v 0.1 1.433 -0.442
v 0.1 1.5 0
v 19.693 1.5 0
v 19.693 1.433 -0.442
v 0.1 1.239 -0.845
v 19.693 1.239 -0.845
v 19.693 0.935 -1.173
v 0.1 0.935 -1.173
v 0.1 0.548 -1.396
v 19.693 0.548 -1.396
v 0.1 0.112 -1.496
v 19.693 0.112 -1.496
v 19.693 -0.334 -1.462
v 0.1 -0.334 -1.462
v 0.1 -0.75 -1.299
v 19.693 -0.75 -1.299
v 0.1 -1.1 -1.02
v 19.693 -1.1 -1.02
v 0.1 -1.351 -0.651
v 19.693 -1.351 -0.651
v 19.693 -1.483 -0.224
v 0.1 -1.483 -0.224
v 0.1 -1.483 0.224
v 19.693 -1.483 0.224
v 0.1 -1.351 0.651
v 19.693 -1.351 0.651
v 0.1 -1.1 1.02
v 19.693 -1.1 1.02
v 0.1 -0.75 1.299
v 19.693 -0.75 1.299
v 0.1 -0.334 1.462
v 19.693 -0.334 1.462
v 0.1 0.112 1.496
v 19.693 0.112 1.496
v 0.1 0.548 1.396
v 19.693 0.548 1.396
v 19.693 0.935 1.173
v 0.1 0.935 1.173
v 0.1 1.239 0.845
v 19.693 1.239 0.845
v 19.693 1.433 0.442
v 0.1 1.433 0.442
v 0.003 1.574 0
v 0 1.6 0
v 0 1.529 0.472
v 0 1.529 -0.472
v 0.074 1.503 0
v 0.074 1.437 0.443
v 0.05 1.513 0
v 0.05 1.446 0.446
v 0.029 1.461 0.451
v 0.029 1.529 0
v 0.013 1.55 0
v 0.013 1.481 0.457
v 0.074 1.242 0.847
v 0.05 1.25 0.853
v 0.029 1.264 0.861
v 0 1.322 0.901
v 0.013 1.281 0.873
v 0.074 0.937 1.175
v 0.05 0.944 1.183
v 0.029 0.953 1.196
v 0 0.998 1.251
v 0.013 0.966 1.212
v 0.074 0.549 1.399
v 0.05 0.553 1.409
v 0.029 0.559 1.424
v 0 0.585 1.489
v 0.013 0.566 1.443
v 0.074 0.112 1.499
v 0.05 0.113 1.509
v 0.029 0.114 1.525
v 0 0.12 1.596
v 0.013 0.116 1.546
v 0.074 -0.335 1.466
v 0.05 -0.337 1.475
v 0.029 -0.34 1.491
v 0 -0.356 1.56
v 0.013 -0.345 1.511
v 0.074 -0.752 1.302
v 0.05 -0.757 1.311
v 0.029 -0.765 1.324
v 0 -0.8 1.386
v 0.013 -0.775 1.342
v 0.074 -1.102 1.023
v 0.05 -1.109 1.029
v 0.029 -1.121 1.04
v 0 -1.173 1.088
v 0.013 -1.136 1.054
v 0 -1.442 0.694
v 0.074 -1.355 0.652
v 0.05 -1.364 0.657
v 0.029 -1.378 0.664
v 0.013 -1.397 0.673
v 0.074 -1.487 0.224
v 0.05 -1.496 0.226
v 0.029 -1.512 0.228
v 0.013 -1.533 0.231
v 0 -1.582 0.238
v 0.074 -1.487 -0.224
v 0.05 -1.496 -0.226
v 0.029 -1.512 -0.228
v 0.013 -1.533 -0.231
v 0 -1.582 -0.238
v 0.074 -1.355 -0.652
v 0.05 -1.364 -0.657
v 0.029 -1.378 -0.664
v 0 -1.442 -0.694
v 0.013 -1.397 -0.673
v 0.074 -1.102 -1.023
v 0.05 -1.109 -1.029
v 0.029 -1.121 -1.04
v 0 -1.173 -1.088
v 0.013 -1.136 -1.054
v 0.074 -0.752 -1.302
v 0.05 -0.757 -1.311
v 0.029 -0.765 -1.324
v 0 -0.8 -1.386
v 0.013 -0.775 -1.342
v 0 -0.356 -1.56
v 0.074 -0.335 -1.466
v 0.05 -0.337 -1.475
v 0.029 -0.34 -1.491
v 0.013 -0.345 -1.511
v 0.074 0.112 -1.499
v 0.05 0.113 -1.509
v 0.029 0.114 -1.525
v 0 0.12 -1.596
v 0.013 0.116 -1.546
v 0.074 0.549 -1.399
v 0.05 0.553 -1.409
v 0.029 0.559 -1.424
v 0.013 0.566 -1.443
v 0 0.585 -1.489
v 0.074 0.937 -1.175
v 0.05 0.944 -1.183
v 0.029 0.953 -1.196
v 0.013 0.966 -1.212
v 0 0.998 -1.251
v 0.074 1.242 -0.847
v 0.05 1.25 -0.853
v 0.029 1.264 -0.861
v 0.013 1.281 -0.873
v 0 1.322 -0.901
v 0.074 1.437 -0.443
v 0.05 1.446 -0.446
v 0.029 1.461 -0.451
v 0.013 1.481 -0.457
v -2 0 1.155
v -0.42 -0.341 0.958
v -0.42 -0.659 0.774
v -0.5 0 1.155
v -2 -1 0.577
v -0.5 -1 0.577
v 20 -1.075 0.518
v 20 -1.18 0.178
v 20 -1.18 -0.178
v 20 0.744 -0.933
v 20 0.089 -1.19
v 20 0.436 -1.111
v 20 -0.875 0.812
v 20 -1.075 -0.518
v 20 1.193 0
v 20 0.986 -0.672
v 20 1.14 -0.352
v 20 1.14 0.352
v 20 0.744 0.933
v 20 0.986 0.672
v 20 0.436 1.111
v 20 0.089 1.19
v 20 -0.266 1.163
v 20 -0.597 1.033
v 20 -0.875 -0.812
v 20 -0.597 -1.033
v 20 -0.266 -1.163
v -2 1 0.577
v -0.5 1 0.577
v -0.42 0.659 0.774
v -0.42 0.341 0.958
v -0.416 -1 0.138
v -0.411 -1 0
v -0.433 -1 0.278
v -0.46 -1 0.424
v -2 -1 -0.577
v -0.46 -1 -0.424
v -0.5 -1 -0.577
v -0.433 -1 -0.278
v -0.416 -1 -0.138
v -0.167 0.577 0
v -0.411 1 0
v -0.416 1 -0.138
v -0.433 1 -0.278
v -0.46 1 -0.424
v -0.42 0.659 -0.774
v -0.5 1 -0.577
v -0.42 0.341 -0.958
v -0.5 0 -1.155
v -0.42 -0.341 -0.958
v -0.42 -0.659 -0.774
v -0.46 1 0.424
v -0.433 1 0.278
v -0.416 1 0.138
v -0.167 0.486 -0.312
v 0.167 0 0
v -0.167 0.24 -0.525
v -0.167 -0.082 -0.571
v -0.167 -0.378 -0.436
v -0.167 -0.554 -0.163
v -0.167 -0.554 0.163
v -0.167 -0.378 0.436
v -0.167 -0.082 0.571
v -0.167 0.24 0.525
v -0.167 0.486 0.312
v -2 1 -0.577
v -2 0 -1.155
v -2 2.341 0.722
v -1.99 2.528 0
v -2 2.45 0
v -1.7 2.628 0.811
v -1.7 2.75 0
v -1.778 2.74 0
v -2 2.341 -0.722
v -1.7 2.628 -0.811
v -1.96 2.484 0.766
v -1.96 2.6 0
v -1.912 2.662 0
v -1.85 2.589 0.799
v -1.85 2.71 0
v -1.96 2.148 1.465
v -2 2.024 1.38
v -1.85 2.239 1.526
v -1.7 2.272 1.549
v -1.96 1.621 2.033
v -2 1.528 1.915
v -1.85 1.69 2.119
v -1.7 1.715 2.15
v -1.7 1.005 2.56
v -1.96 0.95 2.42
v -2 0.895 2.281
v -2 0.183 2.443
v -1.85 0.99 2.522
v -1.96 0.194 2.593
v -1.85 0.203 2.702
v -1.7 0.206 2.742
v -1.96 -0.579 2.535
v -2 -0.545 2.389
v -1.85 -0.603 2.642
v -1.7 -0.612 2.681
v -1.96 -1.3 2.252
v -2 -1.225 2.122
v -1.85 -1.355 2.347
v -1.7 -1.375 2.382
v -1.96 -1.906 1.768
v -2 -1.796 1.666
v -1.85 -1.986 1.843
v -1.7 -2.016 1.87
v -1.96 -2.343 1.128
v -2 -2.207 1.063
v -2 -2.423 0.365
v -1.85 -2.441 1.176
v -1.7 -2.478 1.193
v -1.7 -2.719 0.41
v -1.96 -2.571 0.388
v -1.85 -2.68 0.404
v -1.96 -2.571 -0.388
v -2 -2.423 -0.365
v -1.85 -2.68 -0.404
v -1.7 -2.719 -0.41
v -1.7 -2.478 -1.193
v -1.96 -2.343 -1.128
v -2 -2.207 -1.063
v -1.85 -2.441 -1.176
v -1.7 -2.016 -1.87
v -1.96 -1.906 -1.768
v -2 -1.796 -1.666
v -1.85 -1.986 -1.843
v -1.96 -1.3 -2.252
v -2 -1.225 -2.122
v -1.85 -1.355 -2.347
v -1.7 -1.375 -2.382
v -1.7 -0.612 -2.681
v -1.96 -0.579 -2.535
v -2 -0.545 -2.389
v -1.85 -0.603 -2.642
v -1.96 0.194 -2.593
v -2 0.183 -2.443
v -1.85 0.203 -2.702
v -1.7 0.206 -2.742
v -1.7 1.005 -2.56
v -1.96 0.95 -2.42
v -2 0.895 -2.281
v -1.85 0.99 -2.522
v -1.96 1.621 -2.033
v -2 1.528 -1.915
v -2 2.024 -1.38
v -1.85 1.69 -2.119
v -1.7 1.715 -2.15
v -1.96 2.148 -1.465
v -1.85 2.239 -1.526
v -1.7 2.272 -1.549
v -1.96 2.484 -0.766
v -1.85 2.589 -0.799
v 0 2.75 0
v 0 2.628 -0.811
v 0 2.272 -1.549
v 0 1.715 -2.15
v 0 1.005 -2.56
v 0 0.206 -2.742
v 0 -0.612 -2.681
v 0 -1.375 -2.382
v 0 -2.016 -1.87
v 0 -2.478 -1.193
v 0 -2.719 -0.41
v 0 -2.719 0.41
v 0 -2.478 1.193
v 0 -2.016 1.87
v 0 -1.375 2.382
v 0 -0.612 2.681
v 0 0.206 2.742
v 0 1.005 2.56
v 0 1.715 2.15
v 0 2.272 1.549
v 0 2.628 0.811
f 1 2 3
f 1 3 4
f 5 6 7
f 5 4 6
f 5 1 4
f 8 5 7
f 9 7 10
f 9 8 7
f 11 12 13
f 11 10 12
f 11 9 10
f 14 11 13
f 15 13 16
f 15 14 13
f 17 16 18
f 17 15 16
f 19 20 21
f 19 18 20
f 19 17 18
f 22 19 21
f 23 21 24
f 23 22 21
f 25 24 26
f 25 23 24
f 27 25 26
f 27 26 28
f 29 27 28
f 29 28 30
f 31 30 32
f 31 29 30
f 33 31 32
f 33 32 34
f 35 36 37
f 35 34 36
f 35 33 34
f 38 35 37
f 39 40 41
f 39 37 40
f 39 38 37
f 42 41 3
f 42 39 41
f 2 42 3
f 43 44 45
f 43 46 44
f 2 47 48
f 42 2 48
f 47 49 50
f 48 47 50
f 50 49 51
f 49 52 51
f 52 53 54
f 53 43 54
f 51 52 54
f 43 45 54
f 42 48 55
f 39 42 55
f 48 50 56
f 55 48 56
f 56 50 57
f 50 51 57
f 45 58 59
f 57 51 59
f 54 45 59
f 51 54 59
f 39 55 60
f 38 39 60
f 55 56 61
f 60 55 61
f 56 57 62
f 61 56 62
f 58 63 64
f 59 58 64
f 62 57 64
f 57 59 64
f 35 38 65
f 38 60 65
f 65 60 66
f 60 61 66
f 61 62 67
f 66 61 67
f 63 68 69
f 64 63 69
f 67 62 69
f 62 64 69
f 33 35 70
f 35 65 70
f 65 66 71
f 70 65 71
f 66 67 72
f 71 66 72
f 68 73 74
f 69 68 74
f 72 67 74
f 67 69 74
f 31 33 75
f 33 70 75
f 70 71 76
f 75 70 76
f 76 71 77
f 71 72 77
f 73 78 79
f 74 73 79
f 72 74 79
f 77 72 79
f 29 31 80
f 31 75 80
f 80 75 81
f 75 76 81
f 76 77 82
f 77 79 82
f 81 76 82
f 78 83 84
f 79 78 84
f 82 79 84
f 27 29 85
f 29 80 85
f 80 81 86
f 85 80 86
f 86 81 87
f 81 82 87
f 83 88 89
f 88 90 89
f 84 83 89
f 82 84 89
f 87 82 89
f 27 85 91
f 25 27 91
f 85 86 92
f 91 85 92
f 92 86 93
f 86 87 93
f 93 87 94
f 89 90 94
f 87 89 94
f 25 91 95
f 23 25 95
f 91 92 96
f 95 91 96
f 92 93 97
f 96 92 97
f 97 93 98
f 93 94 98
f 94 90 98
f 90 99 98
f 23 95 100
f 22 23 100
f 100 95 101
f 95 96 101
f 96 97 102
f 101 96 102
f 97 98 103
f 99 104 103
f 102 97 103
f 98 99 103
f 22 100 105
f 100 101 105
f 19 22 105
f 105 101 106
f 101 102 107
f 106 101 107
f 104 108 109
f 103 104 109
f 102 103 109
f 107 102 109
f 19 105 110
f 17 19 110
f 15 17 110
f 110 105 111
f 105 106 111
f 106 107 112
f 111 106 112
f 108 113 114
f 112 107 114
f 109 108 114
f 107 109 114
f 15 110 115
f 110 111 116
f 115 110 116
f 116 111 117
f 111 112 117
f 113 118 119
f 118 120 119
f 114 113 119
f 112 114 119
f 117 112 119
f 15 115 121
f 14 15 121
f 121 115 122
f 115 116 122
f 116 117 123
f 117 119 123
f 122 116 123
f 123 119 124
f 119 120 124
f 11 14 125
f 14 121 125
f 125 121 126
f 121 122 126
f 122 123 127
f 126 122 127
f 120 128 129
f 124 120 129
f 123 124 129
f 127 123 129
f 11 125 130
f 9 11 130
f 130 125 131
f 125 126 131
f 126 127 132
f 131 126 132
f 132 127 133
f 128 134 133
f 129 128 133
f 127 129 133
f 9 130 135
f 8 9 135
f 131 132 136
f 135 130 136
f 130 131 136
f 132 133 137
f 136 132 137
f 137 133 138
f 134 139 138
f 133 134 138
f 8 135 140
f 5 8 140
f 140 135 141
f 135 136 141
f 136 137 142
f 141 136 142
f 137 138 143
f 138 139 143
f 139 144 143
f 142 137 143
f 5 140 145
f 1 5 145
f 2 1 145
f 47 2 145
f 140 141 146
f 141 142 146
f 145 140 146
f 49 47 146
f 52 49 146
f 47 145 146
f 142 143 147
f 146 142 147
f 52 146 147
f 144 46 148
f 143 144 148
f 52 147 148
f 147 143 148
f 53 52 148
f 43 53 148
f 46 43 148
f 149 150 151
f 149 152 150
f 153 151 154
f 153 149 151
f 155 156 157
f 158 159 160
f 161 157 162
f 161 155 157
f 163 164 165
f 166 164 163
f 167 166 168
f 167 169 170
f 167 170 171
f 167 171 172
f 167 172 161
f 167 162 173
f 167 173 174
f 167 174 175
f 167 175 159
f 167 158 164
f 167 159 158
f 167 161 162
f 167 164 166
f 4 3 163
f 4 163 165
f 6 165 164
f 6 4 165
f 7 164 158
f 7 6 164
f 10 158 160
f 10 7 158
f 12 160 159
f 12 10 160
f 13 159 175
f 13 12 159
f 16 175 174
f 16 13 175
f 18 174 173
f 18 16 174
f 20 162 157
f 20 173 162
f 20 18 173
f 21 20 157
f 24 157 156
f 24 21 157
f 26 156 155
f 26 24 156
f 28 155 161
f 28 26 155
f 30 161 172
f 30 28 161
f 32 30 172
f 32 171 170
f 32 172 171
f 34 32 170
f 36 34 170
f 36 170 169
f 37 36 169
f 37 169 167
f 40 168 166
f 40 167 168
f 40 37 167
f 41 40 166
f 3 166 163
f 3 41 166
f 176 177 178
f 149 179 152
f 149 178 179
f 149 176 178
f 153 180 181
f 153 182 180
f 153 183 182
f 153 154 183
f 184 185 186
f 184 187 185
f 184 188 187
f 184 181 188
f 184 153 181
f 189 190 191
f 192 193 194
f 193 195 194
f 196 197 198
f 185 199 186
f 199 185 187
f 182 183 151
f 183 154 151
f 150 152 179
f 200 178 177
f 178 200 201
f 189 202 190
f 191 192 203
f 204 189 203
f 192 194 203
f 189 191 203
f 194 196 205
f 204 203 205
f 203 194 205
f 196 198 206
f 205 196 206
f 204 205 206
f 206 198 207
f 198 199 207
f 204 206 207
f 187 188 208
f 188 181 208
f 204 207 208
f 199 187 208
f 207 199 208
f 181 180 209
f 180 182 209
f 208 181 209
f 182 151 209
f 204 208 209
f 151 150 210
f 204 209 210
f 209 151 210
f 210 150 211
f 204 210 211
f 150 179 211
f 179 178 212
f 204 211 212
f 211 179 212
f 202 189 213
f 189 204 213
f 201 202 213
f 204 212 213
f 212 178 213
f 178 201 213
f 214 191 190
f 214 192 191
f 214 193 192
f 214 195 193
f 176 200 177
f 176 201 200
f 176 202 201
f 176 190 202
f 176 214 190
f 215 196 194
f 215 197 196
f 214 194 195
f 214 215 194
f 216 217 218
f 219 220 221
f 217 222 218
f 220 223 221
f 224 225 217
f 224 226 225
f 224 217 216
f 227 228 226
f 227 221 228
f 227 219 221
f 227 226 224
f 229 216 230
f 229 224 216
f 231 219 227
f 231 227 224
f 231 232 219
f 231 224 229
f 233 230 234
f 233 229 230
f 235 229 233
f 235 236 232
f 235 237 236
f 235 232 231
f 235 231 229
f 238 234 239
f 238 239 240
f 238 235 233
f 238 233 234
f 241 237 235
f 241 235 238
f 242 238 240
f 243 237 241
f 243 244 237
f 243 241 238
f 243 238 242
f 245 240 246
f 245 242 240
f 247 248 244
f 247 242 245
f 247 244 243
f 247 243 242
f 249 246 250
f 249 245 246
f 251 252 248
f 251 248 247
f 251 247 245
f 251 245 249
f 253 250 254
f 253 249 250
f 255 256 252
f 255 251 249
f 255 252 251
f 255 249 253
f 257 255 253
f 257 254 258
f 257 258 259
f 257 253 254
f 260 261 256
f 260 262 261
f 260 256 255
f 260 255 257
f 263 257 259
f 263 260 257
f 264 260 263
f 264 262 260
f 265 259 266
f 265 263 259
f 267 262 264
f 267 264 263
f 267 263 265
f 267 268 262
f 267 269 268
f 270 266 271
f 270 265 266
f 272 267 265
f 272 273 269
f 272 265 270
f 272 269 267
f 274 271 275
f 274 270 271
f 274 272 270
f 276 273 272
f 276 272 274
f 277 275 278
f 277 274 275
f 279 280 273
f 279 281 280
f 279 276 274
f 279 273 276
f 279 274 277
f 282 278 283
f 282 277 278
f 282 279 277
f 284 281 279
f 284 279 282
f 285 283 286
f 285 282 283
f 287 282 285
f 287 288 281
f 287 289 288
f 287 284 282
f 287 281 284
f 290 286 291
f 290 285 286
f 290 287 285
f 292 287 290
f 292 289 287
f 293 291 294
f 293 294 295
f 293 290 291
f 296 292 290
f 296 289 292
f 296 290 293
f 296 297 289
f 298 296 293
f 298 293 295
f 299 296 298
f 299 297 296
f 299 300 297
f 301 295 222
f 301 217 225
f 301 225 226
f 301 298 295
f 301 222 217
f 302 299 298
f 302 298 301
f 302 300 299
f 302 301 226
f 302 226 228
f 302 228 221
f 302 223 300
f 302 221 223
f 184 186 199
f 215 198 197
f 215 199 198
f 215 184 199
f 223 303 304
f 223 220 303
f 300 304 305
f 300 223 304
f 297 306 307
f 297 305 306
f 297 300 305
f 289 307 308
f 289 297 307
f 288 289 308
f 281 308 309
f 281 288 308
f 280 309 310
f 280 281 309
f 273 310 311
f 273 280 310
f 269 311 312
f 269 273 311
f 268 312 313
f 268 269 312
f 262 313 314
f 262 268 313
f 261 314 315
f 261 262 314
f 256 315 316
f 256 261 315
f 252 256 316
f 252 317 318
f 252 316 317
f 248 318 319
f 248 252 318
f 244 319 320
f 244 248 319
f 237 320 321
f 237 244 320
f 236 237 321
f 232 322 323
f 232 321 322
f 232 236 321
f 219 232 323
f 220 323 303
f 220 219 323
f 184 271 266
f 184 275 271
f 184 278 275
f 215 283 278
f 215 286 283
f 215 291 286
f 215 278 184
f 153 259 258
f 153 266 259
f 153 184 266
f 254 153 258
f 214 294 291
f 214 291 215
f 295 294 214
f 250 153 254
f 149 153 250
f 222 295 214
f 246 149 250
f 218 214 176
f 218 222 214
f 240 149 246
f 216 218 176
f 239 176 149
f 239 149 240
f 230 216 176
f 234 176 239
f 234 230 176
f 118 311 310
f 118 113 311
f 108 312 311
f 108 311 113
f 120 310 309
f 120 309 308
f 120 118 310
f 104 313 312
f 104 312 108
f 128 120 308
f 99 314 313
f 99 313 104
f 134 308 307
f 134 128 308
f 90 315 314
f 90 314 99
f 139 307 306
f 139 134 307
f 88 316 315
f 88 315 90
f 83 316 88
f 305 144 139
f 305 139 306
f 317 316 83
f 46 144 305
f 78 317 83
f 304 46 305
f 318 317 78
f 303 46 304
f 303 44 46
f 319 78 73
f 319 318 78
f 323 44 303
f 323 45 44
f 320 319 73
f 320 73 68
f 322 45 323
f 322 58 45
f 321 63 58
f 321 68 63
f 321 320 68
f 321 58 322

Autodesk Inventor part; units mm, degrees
ref_plane "YZ Plane" through (0, 0, 0) normal (1, 0, 0) x (0, 1, 0)
ref_plane "XZ Plane" through (0, 0, 0) normal (0, 1, 0) x (-1, 0, 0)
sketch "Sketch1" plane through (0, 0, 0) normal (0, 0, 1) x (1, 0, 0)
  line L0 (0.1667, 0) -> (20, 0)
  line L1 (20, 0) -> (20, 1.5)
  line L2 (20, 1.5) -> (8, 1.5)
  line L3 (8, 1.5) -> (7.6932, 1.5)
  line L4 (7.6932, 1.5) -> (0, 1.5)
  line L5 (0, 1.5) -> (0, 2.75)
  line L6 (0, 2.75) -> (-2, 2.75)
  line L7 (-2, 2.75) -> (-2, 1.1547)
  line L8 (-2, 1.1547) -> (-0.5, 1.1547)
  line L9 (-0.5, 1.1547) -> (0.1667, 0)
  line L10 (-6.4, 0) -> (24.4, 0) projected
  line L11 (0, -0.55) -> (0, 3.3) projected
  line L12 (8, 1.5) -> (0, 1.5) construction
  dimension "d1" = 12
  dimension "d2" = 0.3068
  dimension "d3" = 2
  dimension "d4" = 1.5
  dimension "d5" = 60
  dimension "d6" = 3
  dimension "d7" = 3
  dimension "d8" = 2.3094
  dimension "d9" = 5.5
  dimension "d26" = 20
revolve "Body" add sketch "Sketch1" angle 360 about axis through (0.1667, 0, 0) along (1, 0, 0) contours L9 L11 L4 L3 L2 L1 L0 | L9 L8 L7 L6 L5 L11
sketch "Sketch2" plane through (-2, 0, 0) normal (-1, 0, 0) x (0, 0, 1)
  circle A0 centre (0, 0) radius 1.1547 projected
  line L0 (0, -3.85) -> (0, 3.85) projected
  line L1 (-3.85, 0) -> (3.85, 0) projected
  line L2 (1.1547, 0) -> (0.5774, -1)
  line L3 (0.5774, -1) -> (-0.5774, -1)
  line L4 (-0.5774, -1) -> (-1.1547, 0)
  line L5 (-1.1547, 0) -> (-0.5774, 1)
  line L6 (-0.5774, 1) -> (0.5774, 1)
  line L7 (0.5774, 1) -> (1.1547, 0)
  point P0 (0, 0)
extrude "Slot" add sketch "Sketch2" against normal up to next contours L7 A0 | A0 L2 | L6 L0 A0 | A0 L0 L3 | L0 L6 A0 | A0 L3 L0 | L4 A0 | A0 L5
fillet "Fillet1" radius 0.3 1 edges at (-2, -2.75, 0)
thread "Thread" size "M3x0.5" class "6g" standard "ISO Metric profile" length 12
chamfer "Chamfer1" distance 0.3067 distance2 0.3067 1 edges at (20, -1.5, 0) measured on face at (20, -0.7567, -0.3972)
ref_plane "Work Plane1" through (29, 0, 0) normal (0, -1, 0) x (1, 0, 0)
fillet "Fillet2" radius 0.1 1 edges at (0, -1.5, 0)
equation "\"d1\" = GEL"
equation "\"d3\" = KOH"
equation "\"d4\" = INTI"
equation "\"d6\" = GD"
equation "\"d7\" = BDM"
equation "\"d8\" = 1.1547 * SW"
equation "\"d9\" = KOD"
equation "\"d26\" = NLG"
equation "\"d30\" = R"
equation "\"d17\" = RR"
equation "\"d13\" = GEL"
equation "\"d15\" = -0.5 * SPD + 0.5 * GD"
equation "\"d16\" = GUL"
equation "\"GD\" = NND"
equation "\"NLG\" = 20"
equation "\"GEL\" = 12"
equation "\"KOD\" = 5.5"
equation "\"KOH\" = 2"
equation "\"INTI\" = 1.5"
equation "\"GAL\" = 0.61345 * PTC"
equation "\"GUL\" = 0.61345 * PTC"
equation "\"BDM\" = NND"
equation "\"SW\" = 2"
equation "\"RR\" = 0.3"
equation "\"SPD\" = NND - 1.2269 * PTC"
equation "\"R\" = 0.1"
equation "\"TOA\" = 30deg"
equation "\"GD1\" = THREADDIA - 1.2269 * PTC"
equation "\"THREADDIA\" = 3"
equation "\"FAWI\" = 45deg"
equation "\"ANG\" = 120deg"
equation "\"PTC\" = 0.5"
equation "\"NND\" = 3"
equation "\"E0\" = 1.155 * SW"
properties part number "DIN 7984 - M3 x 20" material "Steel, Mild"
